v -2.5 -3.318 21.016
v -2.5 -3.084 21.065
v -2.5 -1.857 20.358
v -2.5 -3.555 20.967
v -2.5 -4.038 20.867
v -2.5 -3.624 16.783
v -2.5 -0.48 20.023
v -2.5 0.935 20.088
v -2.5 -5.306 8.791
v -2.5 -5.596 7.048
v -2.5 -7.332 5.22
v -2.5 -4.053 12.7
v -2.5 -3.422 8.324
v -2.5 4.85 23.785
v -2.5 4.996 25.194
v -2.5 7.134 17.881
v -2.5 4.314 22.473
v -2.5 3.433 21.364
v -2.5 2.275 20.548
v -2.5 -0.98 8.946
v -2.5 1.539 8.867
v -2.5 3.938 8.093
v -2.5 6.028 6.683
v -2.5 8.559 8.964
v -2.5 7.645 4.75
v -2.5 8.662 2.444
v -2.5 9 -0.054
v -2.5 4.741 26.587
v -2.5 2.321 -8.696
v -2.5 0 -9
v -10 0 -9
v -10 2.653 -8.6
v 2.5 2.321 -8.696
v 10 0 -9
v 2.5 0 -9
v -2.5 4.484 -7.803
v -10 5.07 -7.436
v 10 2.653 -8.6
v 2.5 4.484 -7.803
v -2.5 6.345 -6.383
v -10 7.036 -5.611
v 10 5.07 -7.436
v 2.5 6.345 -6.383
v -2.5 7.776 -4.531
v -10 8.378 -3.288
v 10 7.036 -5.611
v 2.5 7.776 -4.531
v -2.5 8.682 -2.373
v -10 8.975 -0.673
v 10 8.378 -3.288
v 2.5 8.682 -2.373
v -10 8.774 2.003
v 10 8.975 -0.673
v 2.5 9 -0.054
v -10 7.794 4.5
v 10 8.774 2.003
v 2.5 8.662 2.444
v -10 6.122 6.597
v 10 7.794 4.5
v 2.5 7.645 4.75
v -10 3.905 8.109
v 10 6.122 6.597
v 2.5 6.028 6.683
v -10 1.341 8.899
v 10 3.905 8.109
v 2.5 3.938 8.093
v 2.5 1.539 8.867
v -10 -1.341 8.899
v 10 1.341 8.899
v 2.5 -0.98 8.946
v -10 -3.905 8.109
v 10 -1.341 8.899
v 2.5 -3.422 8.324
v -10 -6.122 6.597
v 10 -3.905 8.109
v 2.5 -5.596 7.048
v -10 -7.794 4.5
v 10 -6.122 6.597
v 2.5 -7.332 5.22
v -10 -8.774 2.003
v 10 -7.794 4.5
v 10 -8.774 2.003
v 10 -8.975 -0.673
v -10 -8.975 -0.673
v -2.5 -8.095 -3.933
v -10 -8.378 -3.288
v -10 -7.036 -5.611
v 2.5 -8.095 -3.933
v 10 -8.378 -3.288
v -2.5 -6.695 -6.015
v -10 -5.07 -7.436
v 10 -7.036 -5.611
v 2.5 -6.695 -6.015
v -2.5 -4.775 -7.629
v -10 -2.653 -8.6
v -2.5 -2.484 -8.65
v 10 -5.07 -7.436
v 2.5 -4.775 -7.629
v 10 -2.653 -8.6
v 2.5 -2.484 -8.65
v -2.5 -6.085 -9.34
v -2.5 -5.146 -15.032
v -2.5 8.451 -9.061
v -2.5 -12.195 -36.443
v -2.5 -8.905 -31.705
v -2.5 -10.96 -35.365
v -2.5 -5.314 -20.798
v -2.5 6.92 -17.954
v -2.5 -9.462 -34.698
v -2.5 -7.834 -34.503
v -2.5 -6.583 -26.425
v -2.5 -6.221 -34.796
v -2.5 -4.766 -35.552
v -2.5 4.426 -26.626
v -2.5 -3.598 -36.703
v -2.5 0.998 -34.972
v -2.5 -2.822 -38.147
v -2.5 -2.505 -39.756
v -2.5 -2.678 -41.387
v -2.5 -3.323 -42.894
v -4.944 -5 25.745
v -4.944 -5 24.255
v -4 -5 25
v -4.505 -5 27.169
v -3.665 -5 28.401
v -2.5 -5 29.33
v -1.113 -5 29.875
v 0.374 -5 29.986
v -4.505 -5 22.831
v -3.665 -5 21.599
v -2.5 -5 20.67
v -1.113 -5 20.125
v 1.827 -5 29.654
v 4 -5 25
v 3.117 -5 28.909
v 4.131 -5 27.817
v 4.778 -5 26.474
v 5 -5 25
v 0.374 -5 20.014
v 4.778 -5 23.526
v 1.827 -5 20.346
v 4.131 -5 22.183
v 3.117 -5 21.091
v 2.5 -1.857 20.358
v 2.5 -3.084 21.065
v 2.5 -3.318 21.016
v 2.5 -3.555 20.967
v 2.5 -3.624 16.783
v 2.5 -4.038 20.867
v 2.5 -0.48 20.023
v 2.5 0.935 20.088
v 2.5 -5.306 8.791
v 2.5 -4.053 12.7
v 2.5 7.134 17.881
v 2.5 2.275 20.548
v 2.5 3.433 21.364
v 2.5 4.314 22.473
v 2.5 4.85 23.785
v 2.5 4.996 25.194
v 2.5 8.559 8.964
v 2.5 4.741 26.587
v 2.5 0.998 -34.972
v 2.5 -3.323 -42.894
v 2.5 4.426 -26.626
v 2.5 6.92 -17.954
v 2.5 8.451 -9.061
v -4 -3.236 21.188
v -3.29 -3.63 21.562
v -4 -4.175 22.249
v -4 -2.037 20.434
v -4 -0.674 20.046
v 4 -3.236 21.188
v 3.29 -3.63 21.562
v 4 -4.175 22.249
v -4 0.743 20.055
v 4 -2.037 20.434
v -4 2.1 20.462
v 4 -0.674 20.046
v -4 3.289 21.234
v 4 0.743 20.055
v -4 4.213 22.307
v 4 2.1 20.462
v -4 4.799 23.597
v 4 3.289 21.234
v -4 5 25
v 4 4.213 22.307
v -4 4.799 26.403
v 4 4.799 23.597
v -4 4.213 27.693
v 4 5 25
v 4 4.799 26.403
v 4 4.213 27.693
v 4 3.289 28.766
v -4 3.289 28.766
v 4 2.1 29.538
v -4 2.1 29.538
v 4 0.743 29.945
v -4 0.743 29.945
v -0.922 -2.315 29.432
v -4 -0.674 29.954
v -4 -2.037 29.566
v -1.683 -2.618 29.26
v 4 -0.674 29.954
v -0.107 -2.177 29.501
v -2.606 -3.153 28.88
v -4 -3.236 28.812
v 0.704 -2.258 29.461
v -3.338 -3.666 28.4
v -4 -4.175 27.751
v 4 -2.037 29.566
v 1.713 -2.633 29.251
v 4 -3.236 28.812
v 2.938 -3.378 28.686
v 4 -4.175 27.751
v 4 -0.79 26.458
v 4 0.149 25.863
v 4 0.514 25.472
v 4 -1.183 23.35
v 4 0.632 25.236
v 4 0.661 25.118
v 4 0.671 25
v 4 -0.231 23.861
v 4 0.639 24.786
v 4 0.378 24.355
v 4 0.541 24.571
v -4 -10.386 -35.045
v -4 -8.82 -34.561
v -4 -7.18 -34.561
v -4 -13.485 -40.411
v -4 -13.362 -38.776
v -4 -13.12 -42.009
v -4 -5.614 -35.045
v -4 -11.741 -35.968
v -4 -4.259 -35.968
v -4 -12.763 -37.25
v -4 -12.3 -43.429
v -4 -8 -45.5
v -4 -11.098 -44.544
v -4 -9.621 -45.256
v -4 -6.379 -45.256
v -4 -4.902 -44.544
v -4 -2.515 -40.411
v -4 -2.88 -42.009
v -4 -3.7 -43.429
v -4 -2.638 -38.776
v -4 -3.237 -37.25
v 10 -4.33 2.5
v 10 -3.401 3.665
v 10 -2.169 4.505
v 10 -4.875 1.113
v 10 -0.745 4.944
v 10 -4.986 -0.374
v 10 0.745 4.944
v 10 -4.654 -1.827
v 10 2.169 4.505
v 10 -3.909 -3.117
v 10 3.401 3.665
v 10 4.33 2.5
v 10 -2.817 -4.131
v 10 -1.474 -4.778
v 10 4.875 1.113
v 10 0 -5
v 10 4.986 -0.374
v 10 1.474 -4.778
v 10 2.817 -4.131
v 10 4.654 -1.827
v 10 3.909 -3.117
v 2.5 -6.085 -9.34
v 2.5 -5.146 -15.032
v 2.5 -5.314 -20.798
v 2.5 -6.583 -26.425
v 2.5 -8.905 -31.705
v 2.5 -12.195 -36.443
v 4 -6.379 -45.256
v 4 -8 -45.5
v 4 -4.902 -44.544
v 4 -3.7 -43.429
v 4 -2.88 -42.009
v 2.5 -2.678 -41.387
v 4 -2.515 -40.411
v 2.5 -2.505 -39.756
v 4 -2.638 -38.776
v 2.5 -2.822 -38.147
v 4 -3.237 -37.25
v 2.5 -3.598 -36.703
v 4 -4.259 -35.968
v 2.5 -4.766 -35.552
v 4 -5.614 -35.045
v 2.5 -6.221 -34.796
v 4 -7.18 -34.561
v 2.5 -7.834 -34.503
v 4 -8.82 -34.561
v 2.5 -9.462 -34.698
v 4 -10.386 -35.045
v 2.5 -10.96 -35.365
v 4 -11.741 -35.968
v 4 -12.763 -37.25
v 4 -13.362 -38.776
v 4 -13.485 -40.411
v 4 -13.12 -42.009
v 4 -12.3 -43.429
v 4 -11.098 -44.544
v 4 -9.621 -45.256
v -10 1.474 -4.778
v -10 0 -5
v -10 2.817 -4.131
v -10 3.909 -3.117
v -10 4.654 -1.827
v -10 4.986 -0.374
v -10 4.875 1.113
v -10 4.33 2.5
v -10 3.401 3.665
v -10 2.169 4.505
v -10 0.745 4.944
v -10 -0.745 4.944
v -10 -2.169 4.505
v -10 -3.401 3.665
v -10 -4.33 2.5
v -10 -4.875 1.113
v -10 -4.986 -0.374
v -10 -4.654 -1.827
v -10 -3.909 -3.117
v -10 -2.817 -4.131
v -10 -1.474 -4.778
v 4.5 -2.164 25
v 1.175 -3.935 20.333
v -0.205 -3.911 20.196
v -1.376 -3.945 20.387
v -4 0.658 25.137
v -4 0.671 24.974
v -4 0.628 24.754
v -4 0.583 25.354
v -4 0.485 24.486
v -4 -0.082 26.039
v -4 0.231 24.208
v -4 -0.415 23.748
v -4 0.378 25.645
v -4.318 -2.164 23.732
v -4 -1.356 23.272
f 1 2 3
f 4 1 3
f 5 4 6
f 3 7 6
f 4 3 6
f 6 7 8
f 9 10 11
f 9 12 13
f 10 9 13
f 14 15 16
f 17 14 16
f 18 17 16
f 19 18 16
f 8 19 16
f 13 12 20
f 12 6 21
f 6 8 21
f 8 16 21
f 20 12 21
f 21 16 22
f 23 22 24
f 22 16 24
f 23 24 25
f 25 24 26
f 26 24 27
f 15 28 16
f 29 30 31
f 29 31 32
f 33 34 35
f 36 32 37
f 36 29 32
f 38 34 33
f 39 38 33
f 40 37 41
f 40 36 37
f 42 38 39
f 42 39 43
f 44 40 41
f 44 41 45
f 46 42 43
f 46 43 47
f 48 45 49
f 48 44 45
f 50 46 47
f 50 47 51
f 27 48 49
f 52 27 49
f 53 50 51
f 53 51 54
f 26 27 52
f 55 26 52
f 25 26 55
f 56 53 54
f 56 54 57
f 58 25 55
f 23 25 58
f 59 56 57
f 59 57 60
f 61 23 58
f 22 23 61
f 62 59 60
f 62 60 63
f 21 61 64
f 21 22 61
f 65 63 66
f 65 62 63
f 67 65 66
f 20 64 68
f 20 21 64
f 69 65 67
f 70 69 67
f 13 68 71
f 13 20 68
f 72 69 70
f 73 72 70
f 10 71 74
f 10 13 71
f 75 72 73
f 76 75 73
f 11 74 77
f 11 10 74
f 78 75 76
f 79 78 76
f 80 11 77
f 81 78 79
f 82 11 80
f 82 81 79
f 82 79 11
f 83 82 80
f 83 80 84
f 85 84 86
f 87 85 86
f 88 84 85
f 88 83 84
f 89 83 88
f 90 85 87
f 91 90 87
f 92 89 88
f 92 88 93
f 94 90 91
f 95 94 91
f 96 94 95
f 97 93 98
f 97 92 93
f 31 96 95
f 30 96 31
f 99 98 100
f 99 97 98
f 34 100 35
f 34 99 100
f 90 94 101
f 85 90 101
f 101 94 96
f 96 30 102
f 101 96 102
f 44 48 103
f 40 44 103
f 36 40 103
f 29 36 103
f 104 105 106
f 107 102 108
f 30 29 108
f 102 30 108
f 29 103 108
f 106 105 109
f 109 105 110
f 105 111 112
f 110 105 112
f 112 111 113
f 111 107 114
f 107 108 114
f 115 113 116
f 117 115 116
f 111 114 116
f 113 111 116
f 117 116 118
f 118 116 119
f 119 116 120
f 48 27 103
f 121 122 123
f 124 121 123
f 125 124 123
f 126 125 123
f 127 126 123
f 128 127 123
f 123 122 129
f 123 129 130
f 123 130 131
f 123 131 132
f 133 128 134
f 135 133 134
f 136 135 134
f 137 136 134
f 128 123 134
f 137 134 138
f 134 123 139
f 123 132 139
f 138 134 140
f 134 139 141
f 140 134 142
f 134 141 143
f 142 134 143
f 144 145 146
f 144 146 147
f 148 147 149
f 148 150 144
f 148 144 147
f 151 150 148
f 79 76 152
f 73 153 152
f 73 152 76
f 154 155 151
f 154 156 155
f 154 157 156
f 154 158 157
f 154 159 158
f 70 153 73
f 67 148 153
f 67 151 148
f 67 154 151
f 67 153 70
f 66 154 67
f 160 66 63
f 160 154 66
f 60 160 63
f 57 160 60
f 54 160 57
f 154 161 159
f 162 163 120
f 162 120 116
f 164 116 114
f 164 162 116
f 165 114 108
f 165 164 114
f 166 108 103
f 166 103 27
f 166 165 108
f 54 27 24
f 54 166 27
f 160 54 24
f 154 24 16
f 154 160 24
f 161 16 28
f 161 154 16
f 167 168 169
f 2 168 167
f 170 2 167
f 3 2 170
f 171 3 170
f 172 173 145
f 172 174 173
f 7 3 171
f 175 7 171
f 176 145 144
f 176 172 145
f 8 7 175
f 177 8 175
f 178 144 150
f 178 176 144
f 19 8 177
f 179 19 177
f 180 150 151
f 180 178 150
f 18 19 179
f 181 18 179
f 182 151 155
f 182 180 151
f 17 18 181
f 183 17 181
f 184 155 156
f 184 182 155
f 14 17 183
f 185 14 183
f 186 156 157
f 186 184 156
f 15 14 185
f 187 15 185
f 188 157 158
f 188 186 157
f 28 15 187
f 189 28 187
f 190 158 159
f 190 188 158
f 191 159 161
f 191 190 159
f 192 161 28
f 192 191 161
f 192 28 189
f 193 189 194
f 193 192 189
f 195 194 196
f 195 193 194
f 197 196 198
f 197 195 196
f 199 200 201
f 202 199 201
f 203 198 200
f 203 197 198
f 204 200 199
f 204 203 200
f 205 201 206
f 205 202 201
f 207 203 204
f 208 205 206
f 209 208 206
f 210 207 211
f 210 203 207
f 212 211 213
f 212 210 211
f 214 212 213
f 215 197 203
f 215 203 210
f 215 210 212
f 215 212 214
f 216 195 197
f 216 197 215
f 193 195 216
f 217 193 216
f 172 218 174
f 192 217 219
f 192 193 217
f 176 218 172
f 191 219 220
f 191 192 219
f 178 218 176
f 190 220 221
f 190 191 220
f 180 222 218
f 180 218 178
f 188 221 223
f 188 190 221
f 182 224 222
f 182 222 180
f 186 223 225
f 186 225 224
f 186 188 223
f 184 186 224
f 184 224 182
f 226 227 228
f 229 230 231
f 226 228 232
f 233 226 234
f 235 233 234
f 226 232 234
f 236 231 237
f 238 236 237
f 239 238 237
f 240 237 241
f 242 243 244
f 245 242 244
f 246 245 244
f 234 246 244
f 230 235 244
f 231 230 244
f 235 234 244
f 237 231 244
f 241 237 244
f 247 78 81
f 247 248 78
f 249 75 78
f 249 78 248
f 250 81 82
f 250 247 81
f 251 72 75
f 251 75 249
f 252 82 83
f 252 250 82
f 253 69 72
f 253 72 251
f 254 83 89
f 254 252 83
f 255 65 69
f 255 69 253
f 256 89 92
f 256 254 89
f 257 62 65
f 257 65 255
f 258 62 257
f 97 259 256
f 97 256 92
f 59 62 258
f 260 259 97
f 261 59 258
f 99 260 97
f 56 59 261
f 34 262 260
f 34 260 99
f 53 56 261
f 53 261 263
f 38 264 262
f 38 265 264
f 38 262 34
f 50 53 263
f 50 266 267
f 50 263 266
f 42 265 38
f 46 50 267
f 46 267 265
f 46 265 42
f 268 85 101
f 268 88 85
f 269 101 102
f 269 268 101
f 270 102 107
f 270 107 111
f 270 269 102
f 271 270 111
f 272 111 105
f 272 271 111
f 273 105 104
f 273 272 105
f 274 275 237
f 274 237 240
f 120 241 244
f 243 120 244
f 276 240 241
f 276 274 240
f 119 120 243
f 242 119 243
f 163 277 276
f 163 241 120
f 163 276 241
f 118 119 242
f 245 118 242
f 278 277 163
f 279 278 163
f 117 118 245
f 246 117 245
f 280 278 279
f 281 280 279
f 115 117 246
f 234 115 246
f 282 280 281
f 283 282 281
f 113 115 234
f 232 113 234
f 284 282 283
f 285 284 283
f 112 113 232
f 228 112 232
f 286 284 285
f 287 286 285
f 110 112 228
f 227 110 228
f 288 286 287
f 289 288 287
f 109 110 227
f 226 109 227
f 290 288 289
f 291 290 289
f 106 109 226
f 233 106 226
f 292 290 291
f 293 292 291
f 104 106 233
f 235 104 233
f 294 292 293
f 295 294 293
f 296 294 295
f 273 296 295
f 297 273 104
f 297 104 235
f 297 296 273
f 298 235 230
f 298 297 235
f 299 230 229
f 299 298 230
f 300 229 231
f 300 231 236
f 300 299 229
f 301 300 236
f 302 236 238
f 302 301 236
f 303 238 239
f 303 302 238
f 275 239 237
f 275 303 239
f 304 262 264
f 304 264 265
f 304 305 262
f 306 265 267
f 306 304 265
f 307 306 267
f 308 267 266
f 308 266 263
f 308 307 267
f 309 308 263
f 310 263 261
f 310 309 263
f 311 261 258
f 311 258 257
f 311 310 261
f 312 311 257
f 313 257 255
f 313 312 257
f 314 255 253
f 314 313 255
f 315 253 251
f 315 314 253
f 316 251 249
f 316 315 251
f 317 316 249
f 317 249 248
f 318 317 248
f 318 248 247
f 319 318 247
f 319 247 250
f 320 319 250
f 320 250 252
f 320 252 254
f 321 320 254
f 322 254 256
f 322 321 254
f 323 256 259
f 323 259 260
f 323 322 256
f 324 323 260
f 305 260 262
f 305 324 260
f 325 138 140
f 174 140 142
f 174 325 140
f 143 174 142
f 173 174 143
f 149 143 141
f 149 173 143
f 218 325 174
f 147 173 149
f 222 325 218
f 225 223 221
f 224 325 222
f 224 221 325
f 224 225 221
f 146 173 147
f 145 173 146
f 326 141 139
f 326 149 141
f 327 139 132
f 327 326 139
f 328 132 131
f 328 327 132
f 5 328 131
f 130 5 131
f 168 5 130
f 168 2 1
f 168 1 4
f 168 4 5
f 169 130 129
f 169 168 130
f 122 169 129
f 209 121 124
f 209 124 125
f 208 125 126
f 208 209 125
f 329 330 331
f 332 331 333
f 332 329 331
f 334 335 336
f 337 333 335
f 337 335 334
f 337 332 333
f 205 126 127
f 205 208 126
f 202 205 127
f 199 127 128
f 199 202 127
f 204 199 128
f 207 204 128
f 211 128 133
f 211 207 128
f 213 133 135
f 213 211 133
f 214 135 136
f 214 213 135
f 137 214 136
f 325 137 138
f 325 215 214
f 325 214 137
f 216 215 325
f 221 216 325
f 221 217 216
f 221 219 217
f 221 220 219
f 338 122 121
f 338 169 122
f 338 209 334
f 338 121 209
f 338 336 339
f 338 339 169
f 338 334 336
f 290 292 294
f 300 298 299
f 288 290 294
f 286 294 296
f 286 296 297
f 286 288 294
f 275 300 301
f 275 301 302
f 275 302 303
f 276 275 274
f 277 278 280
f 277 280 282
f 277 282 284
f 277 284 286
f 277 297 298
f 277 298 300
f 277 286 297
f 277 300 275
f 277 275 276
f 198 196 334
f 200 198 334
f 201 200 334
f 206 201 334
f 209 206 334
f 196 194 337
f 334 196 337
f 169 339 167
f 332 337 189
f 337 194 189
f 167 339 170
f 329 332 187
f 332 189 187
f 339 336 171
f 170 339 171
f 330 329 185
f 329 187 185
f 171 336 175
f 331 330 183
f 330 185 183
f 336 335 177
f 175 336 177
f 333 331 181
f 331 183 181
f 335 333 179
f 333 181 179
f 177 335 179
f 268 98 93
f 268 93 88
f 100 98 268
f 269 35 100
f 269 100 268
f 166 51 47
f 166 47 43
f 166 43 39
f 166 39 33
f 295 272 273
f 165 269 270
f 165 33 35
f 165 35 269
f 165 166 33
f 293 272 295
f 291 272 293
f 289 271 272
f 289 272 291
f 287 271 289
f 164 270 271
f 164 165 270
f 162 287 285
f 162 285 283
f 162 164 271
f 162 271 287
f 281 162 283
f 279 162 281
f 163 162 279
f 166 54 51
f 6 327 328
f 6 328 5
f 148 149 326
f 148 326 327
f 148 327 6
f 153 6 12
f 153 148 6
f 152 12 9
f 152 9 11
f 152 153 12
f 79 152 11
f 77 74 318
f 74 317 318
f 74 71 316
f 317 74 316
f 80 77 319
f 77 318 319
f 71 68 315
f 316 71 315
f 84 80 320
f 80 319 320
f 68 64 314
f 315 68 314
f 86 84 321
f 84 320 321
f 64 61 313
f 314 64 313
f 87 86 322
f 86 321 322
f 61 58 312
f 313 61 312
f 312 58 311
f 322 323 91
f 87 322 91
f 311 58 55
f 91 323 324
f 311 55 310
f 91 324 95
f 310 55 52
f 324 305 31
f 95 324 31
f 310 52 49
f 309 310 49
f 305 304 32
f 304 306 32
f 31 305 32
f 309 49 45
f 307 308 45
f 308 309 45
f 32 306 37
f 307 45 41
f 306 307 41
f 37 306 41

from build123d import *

# Parameters (mm, degrees)
SKETCH1_R             = 5
BOSS_EXTRUDE1_DEPTH   = 4
SKETCH1_R_2           = 5.5
BOSS_EXTRUDE1_2_DEPTH = 4
BOSS_EXTRUDE2_DEPTH   = 2.5
SKETCH1_5_R           = 5
BOSS_EXTRUDE3_DEPTH   = 10
SKETCH2_R             = 5
BOSS_EXTRUDE4_DEPTH   = 6
BOSS_EXTRUDE4_TAPER   = 10


with BuildPart() as part:
    # Sketch1 → Boss-Extrude1 (new, symmetric)
    with BuildSketch(Plane(origin=(0, 0, 0), x_dir=(0, 0, -1), z_dir=(1, 0, 0))):
        with Locations((-25, 0)):
            Circle(SKETCH1_R)
    extrude(amount=BOSS_EXTRUDE1_DEPTH, both=True)



with BuildPart() as body_2:
    # Sketch1 → Boss-Extrude1 2 (new, symmetric)
    with BuildSketch(Plane(origin=(0, 0, 0), x_dir=(0, 0, -1), z_dir=(1, 0, 0))):
        with Locations((40, -8)):
            Circle(SKETCH1_R_2)
    extrude(amount=BOSS_EXTRUDE1_2_DEPTH, both=True)


with BuildPart() as part_1:
    add(part.part)

    add(body_2.part)  # Boss-Extrude2 merges body 2
    # Sketch1<4> → Boss-Extrude2 (add, symmetric)
    with BuildSketch(Plane(origin=(0, 0, 0), x_dir=(0, 0, -1), z_dir=(1, 0, 0))):
        with BuildLine():
            ThreePointArc((-23.364, -4.72477555), (-13.975777786, -3.827150749), (-5.22, -7.331548268))
            ThreePointArc((-5.22, -7.331548268), (-8.564434584, 2.765946539), (0.054339506, 8.999835955))
            ThreePointArc((0.054339506, 8.999835955), (-13.442029091, 7.968983561), (-26.587261688, 4.741371145))
            ThreePointArc((-26.587261688, 4.741371145), (-20.266863918, 1.611652205), (-23.364, -4.72477555))
        make_face()
        with BuildLine():
            ThreePointArc((0.054339506, 8.999835955), (8.776905386, 1.99146475), (3.93314704, -8.09508211))
            ThreePointArc((3.93314704, -8.09508211), (20.797515441, -5.314475766), (36.443380407, -12.195289867))
            ThreePointArc((36.443380407, -12.195289867), (35.551534206, -4.76562957), (42.894164623, -3.323055363))
            ThreePointArc((42.894164623, -3.323055363), (22.323850565, 5.791970771), (0.054339506, 8.999835955))
        make_face()
    extrude(amount=BOSS_EXTRUDE2_DEPTH, both=True)

    # Sketch1<5> → Boss-Extrude3 (add, symmetric)
    with BuildSketch(Plane(origin=(0, 0, 0), x_dir=(0, 0, -1), z_dir=(1, 0, 0))):
        with BuildLine():
            ThreePointArc((0.054339506, 8.999835955), (-8.564434584, 2.765946539), (-5.22, -7.331548268))
            ThreePointArc((-5.22, -7.331548268), (-0.748160155, -8.968849223), (3.93314704, -8.09508211))
            ThreePointArc((3.93314704, -8.09508211), (7.628837505, -4.775022337), (9, 0))
            ThreePointArc((9, 0), (6.383144035, 6.344720027), (0.054339506, 8.999835955))
        make_face()
        Circle(SKETCH1_5_R, mode=Mode.SUBTRACT)
    extrude(amount=BOSS_EXTRUDE3_DEPTH, both=True)

    # Sketch2 → Boss-Extrude4 (add)
    with BuildSketch(Plane(origin=(0, -5, 0), x_dir=(1, 0, 0), z_dir=(0, 1, 0))):
        with Locations((0, -25)):
            Circle(SKETCH2_R)
    extrude(amount=BOSS_EXTRUDE4_DEPTH, taper=BOSS_EXTRUDE4_TAPER)


solid = part_1.part
